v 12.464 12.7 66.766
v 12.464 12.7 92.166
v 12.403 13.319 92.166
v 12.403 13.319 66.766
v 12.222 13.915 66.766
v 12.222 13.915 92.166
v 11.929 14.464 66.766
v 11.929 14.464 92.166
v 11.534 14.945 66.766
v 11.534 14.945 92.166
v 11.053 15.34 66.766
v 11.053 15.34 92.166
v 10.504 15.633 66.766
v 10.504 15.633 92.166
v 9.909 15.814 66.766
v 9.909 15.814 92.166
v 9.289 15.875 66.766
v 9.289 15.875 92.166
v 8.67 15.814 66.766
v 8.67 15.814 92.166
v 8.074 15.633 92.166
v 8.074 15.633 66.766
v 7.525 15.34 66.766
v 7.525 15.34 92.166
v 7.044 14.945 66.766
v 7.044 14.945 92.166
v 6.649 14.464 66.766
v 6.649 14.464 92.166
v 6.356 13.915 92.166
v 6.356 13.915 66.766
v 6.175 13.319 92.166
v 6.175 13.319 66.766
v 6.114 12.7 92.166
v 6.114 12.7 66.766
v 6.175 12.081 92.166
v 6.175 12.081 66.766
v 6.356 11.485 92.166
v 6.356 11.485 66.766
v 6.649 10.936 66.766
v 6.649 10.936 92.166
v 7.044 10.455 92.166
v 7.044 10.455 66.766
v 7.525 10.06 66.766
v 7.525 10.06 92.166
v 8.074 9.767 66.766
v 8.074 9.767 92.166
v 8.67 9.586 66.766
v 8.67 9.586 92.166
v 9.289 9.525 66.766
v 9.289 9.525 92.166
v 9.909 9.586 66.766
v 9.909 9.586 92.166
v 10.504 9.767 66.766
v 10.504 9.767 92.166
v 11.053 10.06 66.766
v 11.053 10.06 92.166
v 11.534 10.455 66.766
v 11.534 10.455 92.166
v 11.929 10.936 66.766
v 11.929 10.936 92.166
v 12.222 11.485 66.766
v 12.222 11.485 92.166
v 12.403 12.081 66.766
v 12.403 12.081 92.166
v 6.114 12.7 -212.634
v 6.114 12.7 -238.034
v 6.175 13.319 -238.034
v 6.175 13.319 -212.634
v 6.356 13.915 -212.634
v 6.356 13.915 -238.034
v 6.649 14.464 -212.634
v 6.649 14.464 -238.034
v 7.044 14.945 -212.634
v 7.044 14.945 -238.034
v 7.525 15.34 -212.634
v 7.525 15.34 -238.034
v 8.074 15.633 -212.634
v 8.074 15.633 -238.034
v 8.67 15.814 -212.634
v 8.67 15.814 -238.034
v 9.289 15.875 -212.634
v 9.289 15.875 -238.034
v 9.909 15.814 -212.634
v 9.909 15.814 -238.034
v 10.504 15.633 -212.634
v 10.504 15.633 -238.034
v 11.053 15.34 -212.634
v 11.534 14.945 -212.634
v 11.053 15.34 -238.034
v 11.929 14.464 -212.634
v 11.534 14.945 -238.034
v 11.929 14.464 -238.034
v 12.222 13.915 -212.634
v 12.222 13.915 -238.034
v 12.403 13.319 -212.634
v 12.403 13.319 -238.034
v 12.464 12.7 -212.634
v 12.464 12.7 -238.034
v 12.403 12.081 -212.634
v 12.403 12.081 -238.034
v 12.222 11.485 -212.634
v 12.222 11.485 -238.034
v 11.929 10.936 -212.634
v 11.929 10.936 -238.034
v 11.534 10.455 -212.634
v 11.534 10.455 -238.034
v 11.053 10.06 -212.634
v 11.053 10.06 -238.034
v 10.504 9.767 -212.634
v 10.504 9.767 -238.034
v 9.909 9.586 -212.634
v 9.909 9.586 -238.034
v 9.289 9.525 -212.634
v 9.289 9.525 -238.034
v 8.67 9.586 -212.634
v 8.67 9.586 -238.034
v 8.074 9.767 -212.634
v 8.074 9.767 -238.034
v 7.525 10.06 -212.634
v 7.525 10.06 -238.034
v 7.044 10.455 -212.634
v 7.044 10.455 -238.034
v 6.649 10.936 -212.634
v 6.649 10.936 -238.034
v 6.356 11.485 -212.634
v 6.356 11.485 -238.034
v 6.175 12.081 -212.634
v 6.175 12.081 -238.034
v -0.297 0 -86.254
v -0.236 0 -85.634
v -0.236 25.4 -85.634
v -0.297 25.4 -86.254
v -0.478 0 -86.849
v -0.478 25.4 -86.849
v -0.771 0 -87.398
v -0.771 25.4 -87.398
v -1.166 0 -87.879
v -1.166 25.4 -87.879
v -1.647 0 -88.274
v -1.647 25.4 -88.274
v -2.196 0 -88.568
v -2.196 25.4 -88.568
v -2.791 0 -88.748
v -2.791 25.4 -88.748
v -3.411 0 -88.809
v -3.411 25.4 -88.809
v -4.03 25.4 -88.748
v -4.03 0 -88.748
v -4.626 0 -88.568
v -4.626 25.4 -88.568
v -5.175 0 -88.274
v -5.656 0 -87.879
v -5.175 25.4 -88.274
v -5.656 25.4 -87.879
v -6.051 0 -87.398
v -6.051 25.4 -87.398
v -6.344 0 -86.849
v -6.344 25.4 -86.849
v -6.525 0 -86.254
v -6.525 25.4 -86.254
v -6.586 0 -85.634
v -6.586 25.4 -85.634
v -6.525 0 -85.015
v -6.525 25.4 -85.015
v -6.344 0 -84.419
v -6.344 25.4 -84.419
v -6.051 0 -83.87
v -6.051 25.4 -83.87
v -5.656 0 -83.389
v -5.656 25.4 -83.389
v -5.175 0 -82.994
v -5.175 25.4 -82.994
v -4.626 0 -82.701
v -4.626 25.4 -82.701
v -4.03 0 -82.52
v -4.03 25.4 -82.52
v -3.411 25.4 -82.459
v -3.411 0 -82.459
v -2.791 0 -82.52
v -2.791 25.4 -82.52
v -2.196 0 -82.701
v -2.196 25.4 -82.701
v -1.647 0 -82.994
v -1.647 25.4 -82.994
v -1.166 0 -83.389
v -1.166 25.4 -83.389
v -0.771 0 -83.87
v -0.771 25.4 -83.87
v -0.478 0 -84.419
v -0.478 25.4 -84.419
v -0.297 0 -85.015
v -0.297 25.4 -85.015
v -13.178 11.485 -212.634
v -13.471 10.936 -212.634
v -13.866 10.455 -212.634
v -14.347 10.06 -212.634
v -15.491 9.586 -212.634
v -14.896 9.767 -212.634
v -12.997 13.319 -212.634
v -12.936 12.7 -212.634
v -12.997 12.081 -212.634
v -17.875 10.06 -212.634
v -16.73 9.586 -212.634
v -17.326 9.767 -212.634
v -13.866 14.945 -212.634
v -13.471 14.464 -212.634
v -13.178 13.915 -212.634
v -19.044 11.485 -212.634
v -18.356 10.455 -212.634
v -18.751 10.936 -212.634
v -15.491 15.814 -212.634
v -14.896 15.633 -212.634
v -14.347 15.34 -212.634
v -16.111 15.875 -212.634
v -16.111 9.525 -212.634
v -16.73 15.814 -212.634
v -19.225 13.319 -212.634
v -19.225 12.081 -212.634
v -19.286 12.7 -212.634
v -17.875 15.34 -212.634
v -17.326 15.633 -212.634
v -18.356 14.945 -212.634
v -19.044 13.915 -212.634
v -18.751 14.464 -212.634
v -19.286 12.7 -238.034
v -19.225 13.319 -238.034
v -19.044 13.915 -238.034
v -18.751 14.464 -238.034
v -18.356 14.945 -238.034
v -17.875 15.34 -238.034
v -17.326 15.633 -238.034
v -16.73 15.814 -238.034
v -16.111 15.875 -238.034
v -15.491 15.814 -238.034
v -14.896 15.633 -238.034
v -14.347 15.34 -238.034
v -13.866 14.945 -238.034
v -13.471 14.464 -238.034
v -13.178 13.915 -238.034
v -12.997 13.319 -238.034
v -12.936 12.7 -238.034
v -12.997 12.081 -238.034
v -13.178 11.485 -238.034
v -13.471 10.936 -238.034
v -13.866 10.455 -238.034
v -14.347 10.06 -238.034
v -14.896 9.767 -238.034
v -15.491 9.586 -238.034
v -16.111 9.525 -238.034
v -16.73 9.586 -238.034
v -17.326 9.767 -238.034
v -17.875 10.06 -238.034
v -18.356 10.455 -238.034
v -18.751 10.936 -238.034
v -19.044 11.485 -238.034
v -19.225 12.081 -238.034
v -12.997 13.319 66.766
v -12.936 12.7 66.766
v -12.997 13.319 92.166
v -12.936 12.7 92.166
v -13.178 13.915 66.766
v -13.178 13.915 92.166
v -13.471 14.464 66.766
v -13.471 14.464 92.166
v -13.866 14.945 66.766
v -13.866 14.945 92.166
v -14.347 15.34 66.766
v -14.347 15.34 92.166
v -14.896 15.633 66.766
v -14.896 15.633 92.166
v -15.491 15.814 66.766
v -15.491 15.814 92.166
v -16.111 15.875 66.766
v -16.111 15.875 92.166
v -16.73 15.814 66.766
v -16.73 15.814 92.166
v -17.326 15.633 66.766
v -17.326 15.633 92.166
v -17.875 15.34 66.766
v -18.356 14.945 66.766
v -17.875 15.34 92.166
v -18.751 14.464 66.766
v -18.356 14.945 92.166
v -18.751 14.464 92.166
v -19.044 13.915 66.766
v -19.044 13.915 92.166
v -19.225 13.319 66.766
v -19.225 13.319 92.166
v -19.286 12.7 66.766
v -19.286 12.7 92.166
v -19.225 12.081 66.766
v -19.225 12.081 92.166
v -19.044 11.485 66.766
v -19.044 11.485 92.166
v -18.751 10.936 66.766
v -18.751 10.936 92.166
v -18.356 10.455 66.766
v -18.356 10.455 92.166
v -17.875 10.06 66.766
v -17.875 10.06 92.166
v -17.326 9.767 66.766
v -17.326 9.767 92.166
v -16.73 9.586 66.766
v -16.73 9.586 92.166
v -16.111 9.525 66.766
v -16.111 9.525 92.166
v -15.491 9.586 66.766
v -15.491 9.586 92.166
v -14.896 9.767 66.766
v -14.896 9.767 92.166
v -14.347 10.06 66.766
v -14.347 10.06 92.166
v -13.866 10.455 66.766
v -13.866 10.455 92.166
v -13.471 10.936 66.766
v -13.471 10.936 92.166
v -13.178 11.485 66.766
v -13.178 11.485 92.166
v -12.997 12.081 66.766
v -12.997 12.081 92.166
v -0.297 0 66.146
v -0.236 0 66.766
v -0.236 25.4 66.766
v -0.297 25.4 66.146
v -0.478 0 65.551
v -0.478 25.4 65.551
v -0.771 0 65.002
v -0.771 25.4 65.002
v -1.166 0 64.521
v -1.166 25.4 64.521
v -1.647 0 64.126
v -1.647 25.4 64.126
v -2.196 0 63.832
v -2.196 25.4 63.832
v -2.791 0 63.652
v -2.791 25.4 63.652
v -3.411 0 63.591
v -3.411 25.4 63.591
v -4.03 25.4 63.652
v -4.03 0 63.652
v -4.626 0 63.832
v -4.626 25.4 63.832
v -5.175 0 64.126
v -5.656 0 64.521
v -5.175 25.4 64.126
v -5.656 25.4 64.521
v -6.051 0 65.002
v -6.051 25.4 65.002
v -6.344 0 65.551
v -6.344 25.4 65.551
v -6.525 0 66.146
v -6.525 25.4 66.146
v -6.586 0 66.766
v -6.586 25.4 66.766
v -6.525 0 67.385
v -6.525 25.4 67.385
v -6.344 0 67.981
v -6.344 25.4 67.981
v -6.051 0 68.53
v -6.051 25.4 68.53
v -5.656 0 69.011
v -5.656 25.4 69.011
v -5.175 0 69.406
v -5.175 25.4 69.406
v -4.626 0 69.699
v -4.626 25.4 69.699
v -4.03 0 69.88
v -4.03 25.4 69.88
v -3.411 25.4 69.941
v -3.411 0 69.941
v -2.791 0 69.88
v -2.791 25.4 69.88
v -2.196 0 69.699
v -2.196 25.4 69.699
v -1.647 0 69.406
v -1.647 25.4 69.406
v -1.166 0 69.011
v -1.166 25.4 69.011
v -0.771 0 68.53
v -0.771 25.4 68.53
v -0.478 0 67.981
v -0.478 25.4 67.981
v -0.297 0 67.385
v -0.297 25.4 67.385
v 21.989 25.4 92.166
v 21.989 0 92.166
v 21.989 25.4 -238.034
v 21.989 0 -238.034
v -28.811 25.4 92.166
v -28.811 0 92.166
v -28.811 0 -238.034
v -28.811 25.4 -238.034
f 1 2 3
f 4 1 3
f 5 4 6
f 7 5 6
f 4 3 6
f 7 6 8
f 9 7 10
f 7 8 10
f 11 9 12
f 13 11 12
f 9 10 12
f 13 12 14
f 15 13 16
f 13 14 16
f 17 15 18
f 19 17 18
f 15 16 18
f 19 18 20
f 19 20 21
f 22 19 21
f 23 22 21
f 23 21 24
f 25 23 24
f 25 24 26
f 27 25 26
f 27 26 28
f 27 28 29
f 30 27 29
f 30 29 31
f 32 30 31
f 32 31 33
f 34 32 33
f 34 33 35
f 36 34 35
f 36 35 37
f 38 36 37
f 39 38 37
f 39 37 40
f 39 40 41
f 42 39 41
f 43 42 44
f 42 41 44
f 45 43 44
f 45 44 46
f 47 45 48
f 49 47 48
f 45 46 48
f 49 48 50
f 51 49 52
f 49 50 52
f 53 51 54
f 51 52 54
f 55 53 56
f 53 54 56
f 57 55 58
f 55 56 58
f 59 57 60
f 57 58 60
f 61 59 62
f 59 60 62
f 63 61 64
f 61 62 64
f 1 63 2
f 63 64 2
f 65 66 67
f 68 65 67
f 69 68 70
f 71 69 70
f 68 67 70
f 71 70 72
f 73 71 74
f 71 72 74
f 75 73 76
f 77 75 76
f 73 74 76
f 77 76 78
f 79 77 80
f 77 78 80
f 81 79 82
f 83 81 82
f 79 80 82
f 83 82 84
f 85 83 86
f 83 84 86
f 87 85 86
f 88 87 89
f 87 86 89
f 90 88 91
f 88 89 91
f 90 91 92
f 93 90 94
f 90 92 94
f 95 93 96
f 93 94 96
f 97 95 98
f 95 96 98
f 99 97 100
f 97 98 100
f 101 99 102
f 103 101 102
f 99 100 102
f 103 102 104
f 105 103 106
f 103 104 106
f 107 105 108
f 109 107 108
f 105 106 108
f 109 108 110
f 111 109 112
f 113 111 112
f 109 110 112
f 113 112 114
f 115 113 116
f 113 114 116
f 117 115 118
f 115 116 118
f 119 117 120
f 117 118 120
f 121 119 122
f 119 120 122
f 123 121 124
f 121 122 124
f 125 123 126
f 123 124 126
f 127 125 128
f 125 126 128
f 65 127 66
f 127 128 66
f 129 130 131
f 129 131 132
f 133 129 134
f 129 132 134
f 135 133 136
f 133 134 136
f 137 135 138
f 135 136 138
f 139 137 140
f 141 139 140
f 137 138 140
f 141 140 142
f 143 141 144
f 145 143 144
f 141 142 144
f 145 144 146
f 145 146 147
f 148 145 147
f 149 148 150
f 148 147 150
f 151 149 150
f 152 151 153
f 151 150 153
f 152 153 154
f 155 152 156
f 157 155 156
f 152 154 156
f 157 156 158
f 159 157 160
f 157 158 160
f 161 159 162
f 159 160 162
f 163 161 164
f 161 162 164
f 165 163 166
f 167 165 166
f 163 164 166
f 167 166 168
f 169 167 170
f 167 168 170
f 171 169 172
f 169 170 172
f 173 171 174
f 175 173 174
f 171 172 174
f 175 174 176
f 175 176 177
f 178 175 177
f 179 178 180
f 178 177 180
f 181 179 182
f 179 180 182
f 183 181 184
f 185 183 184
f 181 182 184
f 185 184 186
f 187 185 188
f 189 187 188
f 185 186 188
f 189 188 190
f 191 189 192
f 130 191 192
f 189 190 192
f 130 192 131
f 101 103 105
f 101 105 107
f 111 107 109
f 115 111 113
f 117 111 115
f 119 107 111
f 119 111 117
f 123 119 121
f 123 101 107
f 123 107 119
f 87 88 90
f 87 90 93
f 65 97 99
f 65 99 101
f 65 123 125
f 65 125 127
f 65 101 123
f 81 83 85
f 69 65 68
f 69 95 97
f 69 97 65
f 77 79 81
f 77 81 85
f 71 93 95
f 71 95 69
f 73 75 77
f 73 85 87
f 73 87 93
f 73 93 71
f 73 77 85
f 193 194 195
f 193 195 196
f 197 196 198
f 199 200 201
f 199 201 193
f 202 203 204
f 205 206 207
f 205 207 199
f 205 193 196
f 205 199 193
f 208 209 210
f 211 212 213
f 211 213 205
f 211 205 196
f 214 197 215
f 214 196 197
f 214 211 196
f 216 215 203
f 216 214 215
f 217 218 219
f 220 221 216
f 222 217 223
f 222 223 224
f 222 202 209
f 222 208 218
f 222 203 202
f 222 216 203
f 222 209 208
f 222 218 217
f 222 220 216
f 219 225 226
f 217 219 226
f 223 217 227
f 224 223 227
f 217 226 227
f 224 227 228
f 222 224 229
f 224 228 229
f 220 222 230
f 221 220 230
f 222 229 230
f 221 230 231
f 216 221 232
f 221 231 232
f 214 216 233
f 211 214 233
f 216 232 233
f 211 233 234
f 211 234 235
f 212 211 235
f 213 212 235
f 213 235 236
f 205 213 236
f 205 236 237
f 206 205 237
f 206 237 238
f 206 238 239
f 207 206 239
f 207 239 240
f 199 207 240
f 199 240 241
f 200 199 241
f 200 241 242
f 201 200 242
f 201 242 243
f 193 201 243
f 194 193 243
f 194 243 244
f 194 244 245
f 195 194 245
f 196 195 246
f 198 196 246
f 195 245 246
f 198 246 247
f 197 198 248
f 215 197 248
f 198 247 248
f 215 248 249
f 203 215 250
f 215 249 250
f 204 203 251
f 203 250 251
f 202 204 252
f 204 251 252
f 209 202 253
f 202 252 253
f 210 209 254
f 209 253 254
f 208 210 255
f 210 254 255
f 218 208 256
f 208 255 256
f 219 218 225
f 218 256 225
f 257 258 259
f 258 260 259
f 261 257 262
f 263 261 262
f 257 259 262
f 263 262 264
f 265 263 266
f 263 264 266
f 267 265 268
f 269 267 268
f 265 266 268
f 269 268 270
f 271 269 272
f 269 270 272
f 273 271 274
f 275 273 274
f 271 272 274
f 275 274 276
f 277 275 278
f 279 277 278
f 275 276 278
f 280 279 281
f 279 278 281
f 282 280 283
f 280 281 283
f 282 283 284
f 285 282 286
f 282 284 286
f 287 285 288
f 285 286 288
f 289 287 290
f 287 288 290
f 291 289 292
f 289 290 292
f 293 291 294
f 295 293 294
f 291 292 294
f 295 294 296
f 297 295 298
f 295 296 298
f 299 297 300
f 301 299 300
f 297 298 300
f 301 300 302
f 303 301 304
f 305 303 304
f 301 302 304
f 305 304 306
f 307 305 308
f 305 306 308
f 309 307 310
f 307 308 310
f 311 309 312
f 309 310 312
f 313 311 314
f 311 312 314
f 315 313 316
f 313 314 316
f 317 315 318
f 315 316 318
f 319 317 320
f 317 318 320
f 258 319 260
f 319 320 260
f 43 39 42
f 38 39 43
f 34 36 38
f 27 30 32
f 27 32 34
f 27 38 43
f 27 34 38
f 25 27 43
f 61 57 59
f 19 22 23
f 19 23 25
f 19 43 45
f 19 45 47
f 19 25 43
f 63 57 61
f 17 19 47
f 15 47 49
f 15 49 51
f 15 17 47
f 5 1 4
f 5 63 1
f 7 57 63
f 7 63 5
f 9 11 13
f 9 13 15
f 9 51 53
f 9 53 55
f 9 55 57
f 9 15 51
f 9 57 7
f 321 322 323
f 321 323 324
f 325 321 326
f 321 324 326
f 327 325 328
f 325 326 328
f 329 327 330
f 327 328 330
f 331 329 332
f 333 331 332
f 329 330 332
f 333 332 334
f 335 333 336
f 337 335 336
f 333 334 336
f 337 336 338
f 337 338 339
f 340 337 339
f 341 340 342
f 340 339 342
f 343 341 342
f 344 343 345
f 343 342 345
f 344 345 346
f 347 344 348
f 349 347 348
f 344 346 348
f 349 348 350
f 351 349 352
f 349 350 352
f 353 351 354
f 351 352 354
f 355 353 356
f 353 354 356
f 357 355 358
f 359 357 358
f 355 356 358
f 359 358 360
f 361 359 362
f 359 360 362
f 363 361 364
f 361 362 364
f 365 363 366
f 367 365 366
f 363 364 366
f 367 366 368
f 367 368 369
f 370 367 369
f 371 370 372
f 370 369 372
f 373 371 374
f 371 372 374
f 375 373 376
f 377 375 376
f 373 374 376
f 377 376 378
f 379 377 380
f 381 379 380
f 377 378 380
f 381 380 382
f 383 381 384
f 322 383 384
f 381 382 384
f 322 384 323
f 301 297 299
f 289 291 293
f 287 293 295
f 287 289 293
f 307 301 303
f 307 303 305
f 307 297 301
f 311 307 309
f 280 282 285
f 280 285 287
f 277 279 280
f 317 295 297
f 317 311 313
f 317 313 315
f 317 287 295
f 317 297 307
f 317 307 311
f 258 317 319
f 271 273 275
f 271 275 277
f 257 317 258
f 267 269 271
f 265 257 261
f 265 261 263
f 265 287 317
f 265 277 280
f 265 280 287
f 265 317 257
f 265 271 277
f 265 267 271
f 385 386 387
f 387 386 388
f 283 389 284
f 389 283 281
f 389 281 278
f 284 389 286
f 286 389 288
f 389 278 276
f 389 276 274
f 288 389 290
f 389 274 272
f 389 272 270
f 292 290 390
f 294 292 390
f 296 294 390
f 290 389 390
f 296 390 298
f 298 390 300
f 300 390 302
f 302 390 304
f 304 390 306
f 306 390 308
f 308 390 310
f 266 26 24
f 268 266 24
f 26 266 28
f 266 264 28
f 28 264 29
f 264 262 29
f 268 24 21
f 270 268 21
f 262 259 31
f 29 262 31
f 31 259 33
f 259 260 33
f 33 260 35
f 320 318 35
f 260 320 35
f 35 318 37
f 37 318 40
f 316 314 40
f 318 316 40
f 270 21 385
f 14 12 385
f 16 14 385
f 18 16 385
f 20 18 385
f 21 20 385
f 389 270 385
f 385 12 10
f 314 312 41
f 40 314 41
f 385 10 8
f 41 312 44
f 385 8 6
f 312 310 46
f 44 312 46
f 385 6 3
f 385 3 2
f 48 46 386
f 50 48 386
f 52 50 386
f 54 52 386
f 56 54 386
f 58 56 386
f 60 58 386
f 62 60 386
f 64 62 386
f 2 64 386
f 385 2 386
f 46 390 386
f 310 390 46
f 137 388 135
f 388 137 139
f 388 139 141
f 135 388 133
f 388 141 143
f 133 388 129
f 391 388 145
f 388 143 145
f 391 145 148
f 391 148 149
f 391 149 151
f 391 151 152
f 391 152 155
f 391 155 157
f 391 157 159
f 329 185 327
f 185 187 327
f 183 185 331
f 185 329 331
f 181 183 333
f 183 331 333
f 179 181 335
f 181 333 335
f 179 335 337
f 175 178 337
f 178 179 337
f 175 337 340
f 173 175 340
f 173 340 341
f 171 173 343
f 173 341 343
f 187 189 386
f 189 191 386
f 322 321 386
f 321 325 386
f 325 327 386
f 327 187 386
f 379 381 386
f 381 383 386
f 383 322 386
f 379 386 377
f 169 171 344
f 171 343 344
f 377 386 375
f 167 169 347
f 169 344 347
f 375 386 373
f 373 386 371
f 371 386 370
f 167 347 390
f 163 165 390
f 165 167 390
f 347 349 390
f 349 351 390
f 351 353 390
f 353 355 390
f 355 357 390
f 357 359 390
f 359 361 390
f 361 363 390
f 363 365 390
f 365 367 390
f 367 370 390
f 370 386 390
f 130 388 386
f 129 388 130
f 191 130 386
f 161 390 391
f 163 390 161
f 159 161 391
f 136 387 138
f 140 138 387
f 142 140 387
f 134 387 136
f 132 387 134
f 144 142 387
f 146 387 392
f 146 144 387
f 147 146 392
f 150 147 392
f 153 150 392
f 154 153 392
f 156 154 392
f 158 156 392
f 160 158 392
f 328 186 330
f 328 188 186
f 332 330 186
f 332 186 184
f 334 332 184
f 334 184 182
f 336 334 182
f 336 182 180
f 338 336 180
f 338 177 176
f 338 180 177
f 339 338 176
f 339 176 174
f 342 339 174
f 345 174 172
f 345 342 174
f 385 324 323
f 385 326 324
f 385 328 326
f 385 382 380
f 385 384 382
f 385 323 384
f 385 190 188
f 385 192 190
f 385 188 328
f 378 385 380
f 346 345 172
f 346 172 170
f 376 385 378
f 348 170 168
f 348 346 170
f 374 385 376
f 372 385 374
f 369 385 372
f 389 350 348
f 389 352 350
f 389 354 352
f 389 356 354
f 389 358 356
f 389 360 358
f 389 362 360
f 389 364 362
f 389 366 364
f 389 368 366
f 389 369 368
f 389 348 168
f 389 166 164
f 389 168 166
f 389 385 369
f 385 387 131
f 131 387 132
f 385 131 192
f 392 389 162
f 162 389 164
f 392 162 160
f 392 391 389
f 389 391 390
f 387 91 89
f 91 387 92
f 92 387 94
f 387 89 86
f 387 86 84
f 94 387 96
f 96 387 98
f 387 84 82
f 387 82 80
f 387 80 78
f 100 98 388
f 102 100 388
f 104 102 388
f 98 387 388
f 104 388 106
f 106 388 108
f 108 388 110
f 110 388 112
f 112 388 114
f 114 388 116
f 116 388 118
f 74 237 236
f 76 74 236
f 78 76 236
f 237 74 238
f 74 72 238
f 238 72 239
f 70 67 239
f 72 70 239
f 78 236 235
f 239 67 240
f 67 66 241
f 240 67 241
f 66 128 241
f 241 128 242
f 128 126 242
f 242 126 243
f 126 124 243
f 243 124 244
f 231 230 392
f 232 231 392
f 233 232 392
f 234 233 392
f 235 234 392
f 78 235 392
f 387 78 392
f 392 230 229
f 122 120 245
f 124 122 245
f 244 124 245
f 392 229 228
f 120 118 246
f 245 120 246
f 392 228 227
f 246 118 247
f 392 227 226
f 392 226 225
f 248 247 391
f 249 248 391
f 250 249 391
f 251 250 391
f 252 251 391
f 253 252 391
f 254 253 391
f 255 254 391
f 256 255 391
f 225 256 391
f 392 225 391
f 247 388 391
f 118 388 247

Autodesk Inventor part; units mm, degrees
ref_plane "YZ Plane" through (0, 0, 0) normal (1, 0, 0) x (0, 1, 0)
ref_plane "XZ Plane" through (0, 0, 0) normal (0, 1, 0) x (-1, 0, 0)
ref_plane "XY Plane" through (0, 0, 0) normal (0, 0, 1) x (1, 0, 0)
sketch "Sketch1" plane through (0, 0, 0) normal (0, 1, 0) x (-1, 0, 0)
  line L0 (28.8109, 92.1657) -> (-21.9891, 92.1657)
  line L1 (-21.9891, 92.1657) -> (-21.9891, -238.0343)
  line L2 (-21.9891, -238.0343) -> (28.8109, -238.0343)
  line L3 (28.8109, -238.0343) -> (28.8109, 92.1657)
  point P0 (0, 0)
  dimension "d0" = 50.8
  dimension "d1" = 330.2
extrude "Extrusion1" add sketch "Sketch1" along normal blind 25.4
sketch "Sketch2" plane through (-28.8109, 0, 92.1657) normal (0, 0, 1) x (1, 0, 0)
  line L0 (0, 0) -> (0, 25.4) projected
  line L1 (0, 12.7) -> (50.8, 12.7) construction
  line L2 (50.8, 0) -> (50.8, 25.4) projected
  circle A0 centre (12.7, 12.7) radius 3.175
  circle A1 centre (38.1, 12.7) radius 3.175
  line L3 (50.8, 25.4) -> (0, 25.4) construction
  line L4 (25.4, 25.4) -> (25.4, 0) construction
  line L5 (50.8, 0) -> (0, 0) construction
  point P0 (28.8109, 0)
  dimension "d4" = 6.35
  dimension "d5" = 6.35
  dimension "d6" = 12.7
  dimension "d7" = 12.7
extrude "Extrusion2" cut sketch "Sketch2" against normal blind 25.4
sketch "Sketch3" plane through (21.9891, 0, -238.0343) normal (0, 0, -1) x (-1, 0, 0)
  line L0 (0, 0) -> (0, 25.4) construction
  line L1 (0, 12.7) -> (50.8, 12.7) construction
  line L2 (50.8, 0) -> (50.8, 25.4) construction
  line L3 (50.8, 25.4) -> (0, 25.4) construction
  line L4 (25.4, 25.4) -> (25.4, 0) construction
  line L5 (50.8, 0) -> (0, 0) construction
  circle A0 centre (12.7, 12.7) radius 3.175 projected
  circle A1 centre (12.7, 12.7) radius 3.175 construction
  circle A2 centre (38.1, 12.7) radius 3.175 projected
  circle A3 centre (38.1, 12.7) radius 3.175 construction
  point P0 (21.9891, 0)
extrude "Extrusion3" cut sketch "Sketch3" against normal blind 25.4
sketch "Sketch4" plane through (0, 25.4, 0) normal (0, 1, 0) x (1, 0, 0)
  line L0 (-28.8109, -92.1657) -> (21.9891, -92.1657) construction
  line L1 (-3.4109, -92.1657) -> (-3.4109, 238.0343) construction
  line L2 (21.9891, 238.0343) -> (-28.8109, 238.0343) construction
  line L3 (-28.8109, 238.0343) -> (-28.8109, -92.1657) construction
  line L4 (-28.8109, 72.9343) -> (21.9891, 72.9343) construction
  line L5 (21.9891, -92.1657) -> (21.9891, 238.0343) construction
  circle A0 centre (-3.4109, -66.7657) radius 3.175
  circle A1 centre (-3.4109, 85.6343) radius 3.175
  point P0 (0, 0)
  dimension "d12" = 6.35
  dimension "d13" = 152.4
  dimension "d14" = 25.4
extrude "Extrusion4" cut sketch "Sketch4" against normal through all
properties part number "chair support"
